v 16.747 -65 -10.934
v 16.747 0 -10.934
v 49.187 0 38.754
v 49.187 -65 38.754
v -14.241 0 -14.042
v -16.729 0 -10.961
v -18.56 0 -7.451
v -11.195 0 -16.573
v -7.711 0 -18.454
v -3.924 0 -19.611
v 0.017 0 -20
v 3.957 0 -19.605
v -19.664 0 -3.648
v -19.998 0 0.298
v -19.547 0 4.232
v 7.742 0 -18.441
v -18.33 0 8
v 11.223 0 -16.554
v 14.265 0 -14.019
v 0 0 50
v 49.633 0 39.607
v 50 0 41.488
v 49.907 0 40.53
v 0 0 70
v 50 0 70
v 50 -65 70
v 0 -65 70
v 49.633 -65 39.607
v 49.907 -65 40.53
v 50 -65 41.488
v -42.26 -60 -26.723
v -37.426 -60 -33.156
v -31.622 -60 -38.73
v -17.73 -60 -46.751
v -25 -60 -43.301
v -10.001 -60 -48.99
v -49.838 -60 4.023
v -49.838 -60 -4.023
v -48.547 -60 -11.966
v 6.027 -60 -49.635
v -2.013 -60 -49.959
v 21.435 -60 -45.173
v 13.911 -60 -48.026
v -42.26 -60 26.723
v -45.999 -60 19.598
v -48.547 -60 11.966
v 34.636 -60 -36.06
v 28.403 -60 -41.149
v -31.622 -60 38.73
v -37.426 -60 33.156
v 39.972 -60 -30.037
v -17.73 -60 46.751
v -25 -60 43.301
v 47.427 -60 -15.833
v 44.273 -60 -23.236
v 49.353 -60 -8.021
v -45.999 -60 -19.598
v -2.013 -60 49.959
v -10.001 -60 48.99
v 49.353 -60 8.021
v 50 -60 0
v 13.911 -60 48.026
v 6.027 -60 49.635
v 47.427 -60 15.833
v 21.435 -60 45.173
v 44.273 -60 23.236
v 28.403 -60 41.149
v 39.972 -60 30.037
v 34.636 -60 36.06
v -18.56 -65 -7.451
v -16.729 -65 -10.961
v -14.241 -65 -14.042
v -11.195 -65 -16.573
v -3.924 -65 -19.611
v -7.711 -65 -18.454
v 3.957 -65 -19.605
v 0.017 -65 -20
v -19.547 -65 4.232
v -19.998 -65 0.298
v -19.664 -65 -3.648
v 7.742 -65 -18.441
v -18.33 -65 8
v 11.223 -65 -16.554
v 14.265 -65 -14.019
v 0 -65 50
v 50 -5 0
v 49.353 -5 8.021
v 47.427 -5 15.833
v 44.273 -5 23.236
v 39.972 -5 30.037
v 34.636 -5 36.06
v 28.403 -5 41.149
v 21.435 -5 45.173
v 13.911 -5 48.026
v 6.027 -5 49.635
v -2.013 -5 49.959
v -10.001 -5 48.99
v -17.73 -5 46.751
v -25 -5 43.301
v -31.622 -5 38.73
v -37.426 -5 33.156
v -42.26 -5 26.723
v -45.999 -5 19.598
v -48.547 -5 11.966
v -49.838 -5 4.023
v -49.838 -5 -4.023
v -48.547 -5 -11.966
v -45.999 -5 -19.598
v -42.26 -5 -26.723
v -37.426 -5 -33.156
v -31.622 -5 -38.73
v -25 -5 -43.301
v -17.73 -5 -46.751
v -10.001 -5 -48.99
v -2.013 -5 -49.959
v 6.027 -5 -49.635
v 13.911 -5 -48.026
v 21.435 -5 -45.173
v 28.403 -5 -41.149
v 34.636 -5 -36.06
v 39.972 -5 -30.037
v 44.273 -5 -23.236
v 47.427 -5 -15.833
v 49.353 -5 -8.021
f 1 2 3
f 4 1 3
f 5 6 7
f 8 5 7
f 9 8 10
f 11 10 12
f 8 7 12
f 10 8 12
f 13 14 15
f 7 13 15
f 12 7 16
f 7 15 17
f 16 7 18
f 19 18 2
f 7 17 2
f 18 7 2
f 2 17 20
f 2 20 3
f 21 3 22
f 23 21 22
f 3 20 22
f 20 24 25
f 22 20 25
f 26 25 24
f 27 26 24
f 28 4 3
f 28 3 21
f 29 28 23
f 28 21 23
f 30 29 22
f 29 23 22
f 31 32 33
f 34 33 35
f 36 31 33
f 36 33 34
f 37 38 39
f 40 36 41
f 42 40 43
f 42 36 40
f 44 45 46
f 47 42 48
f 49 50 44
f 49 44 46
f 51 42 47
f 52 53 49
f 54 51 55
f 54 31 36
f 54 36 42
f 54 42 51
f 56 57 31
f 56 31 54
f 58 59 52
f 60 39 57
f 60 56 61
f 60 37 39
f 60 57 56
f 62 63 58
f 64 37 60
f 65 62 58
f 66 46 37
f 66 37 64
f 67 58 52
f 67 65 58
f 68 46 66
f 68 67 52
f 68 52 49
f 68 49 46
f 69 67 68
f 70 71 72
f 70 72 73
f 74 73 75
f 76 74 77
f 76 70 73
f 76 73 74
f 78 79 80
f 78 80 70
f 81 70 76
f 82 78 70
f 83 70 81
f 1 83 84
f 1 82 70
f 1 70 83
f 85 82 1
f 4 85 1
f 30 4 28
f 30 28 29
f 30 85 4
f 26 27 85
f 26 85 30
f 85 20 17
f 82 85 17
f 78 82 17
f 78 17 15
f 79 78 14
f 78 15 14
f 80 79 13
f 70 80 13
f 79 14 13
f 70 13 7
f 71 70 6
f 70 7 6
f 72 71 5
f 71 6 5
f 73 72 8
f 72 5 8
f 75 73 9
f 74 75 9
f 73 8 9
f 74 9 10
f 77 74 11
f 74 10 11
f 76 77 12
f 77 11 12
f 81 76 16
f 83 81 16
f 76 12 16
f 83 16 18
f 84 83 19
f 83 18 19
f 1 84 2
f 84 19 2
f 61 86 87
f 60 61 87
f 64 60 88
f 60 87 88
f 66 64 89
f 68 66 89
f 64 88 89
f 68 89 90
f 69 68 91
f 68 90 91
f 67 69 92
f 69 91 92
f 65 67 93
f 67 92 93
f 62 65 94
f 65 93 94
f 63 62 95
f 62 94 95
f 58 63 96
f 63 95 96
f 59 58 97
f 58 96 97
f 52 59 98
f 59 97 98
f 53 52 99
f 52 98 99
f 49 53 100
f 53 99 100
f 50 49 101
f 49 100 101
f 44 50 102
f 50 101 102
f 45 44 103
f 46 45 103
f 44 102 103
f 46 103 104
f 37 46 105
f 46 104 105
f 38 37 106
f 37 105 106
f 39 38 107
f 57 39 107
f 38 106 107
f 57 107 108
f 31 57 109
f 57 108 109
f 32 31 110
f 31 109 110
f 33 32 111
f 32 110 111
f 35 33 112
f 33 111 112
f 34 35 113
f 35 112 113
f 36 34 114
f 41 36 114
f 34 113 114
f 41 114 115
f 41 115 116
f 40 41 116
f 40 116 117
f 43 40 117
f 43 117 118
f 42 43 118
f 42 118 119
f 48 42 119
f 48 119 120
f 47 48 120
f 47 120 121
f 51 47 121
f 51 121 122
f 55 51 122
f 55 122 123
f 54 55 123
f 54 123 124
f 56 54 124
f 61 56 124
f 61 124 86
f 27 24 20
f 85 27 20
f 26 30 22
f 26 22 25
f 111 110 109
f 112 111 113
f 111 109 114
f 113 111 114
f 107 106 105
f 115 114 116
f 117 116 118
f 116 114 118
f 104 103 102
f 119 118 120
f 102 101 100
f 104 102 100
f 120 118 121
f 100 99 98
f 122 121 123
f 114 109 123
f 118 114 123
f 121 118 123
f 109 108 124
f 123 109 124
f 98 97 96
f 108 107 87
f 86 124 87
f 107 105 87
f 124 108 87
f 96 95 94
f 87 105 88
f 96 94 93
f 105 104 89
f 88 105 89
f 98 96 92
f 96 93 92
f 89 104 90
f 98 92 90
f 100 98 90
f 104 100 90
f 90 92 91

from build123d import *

# Parameters (mm, degrees)
F1_DEPTH = 65
F2_R     = 50
F3_DEPTH = 55


with BuildPart() as f1:
    # F0 (on Front) → F1 (new body)
    with BuildSketch(Plane.XZ):
        with BuildLine():
            Line((0, 50), (-18.330303, 8))
            ThreePointArc((-18.330303, 8), (-9.499833, -17.599806), (16.746854, -10.933567))
            Line((16.746854, -10.933567), (49.186713, 38.754296))
            ThreePointArc((49.186713, 38.754296), (49.792367, 40.061779), (50, 41.487688))
            Line((50, 41.487688), (50, 70))
            Line((50, 70), (0, 70))
            Line((0, 70), (0, 50))
        make_face()
    extrude(amount=F1_DEPTH)


with BuildPart() as f3:
    # F2 (on Front) → F3 (new body)
    with BuildSketch(Plane.XZ):
        Circle(F2_R)
    extrude(amount=F3_DEPTH)


with BuildPart() as f3_1:
    # F4: moved
    add(f3.part.moved(Location((0, -5, 0))))


solid = Compound([f1.part, f3_1.part])
